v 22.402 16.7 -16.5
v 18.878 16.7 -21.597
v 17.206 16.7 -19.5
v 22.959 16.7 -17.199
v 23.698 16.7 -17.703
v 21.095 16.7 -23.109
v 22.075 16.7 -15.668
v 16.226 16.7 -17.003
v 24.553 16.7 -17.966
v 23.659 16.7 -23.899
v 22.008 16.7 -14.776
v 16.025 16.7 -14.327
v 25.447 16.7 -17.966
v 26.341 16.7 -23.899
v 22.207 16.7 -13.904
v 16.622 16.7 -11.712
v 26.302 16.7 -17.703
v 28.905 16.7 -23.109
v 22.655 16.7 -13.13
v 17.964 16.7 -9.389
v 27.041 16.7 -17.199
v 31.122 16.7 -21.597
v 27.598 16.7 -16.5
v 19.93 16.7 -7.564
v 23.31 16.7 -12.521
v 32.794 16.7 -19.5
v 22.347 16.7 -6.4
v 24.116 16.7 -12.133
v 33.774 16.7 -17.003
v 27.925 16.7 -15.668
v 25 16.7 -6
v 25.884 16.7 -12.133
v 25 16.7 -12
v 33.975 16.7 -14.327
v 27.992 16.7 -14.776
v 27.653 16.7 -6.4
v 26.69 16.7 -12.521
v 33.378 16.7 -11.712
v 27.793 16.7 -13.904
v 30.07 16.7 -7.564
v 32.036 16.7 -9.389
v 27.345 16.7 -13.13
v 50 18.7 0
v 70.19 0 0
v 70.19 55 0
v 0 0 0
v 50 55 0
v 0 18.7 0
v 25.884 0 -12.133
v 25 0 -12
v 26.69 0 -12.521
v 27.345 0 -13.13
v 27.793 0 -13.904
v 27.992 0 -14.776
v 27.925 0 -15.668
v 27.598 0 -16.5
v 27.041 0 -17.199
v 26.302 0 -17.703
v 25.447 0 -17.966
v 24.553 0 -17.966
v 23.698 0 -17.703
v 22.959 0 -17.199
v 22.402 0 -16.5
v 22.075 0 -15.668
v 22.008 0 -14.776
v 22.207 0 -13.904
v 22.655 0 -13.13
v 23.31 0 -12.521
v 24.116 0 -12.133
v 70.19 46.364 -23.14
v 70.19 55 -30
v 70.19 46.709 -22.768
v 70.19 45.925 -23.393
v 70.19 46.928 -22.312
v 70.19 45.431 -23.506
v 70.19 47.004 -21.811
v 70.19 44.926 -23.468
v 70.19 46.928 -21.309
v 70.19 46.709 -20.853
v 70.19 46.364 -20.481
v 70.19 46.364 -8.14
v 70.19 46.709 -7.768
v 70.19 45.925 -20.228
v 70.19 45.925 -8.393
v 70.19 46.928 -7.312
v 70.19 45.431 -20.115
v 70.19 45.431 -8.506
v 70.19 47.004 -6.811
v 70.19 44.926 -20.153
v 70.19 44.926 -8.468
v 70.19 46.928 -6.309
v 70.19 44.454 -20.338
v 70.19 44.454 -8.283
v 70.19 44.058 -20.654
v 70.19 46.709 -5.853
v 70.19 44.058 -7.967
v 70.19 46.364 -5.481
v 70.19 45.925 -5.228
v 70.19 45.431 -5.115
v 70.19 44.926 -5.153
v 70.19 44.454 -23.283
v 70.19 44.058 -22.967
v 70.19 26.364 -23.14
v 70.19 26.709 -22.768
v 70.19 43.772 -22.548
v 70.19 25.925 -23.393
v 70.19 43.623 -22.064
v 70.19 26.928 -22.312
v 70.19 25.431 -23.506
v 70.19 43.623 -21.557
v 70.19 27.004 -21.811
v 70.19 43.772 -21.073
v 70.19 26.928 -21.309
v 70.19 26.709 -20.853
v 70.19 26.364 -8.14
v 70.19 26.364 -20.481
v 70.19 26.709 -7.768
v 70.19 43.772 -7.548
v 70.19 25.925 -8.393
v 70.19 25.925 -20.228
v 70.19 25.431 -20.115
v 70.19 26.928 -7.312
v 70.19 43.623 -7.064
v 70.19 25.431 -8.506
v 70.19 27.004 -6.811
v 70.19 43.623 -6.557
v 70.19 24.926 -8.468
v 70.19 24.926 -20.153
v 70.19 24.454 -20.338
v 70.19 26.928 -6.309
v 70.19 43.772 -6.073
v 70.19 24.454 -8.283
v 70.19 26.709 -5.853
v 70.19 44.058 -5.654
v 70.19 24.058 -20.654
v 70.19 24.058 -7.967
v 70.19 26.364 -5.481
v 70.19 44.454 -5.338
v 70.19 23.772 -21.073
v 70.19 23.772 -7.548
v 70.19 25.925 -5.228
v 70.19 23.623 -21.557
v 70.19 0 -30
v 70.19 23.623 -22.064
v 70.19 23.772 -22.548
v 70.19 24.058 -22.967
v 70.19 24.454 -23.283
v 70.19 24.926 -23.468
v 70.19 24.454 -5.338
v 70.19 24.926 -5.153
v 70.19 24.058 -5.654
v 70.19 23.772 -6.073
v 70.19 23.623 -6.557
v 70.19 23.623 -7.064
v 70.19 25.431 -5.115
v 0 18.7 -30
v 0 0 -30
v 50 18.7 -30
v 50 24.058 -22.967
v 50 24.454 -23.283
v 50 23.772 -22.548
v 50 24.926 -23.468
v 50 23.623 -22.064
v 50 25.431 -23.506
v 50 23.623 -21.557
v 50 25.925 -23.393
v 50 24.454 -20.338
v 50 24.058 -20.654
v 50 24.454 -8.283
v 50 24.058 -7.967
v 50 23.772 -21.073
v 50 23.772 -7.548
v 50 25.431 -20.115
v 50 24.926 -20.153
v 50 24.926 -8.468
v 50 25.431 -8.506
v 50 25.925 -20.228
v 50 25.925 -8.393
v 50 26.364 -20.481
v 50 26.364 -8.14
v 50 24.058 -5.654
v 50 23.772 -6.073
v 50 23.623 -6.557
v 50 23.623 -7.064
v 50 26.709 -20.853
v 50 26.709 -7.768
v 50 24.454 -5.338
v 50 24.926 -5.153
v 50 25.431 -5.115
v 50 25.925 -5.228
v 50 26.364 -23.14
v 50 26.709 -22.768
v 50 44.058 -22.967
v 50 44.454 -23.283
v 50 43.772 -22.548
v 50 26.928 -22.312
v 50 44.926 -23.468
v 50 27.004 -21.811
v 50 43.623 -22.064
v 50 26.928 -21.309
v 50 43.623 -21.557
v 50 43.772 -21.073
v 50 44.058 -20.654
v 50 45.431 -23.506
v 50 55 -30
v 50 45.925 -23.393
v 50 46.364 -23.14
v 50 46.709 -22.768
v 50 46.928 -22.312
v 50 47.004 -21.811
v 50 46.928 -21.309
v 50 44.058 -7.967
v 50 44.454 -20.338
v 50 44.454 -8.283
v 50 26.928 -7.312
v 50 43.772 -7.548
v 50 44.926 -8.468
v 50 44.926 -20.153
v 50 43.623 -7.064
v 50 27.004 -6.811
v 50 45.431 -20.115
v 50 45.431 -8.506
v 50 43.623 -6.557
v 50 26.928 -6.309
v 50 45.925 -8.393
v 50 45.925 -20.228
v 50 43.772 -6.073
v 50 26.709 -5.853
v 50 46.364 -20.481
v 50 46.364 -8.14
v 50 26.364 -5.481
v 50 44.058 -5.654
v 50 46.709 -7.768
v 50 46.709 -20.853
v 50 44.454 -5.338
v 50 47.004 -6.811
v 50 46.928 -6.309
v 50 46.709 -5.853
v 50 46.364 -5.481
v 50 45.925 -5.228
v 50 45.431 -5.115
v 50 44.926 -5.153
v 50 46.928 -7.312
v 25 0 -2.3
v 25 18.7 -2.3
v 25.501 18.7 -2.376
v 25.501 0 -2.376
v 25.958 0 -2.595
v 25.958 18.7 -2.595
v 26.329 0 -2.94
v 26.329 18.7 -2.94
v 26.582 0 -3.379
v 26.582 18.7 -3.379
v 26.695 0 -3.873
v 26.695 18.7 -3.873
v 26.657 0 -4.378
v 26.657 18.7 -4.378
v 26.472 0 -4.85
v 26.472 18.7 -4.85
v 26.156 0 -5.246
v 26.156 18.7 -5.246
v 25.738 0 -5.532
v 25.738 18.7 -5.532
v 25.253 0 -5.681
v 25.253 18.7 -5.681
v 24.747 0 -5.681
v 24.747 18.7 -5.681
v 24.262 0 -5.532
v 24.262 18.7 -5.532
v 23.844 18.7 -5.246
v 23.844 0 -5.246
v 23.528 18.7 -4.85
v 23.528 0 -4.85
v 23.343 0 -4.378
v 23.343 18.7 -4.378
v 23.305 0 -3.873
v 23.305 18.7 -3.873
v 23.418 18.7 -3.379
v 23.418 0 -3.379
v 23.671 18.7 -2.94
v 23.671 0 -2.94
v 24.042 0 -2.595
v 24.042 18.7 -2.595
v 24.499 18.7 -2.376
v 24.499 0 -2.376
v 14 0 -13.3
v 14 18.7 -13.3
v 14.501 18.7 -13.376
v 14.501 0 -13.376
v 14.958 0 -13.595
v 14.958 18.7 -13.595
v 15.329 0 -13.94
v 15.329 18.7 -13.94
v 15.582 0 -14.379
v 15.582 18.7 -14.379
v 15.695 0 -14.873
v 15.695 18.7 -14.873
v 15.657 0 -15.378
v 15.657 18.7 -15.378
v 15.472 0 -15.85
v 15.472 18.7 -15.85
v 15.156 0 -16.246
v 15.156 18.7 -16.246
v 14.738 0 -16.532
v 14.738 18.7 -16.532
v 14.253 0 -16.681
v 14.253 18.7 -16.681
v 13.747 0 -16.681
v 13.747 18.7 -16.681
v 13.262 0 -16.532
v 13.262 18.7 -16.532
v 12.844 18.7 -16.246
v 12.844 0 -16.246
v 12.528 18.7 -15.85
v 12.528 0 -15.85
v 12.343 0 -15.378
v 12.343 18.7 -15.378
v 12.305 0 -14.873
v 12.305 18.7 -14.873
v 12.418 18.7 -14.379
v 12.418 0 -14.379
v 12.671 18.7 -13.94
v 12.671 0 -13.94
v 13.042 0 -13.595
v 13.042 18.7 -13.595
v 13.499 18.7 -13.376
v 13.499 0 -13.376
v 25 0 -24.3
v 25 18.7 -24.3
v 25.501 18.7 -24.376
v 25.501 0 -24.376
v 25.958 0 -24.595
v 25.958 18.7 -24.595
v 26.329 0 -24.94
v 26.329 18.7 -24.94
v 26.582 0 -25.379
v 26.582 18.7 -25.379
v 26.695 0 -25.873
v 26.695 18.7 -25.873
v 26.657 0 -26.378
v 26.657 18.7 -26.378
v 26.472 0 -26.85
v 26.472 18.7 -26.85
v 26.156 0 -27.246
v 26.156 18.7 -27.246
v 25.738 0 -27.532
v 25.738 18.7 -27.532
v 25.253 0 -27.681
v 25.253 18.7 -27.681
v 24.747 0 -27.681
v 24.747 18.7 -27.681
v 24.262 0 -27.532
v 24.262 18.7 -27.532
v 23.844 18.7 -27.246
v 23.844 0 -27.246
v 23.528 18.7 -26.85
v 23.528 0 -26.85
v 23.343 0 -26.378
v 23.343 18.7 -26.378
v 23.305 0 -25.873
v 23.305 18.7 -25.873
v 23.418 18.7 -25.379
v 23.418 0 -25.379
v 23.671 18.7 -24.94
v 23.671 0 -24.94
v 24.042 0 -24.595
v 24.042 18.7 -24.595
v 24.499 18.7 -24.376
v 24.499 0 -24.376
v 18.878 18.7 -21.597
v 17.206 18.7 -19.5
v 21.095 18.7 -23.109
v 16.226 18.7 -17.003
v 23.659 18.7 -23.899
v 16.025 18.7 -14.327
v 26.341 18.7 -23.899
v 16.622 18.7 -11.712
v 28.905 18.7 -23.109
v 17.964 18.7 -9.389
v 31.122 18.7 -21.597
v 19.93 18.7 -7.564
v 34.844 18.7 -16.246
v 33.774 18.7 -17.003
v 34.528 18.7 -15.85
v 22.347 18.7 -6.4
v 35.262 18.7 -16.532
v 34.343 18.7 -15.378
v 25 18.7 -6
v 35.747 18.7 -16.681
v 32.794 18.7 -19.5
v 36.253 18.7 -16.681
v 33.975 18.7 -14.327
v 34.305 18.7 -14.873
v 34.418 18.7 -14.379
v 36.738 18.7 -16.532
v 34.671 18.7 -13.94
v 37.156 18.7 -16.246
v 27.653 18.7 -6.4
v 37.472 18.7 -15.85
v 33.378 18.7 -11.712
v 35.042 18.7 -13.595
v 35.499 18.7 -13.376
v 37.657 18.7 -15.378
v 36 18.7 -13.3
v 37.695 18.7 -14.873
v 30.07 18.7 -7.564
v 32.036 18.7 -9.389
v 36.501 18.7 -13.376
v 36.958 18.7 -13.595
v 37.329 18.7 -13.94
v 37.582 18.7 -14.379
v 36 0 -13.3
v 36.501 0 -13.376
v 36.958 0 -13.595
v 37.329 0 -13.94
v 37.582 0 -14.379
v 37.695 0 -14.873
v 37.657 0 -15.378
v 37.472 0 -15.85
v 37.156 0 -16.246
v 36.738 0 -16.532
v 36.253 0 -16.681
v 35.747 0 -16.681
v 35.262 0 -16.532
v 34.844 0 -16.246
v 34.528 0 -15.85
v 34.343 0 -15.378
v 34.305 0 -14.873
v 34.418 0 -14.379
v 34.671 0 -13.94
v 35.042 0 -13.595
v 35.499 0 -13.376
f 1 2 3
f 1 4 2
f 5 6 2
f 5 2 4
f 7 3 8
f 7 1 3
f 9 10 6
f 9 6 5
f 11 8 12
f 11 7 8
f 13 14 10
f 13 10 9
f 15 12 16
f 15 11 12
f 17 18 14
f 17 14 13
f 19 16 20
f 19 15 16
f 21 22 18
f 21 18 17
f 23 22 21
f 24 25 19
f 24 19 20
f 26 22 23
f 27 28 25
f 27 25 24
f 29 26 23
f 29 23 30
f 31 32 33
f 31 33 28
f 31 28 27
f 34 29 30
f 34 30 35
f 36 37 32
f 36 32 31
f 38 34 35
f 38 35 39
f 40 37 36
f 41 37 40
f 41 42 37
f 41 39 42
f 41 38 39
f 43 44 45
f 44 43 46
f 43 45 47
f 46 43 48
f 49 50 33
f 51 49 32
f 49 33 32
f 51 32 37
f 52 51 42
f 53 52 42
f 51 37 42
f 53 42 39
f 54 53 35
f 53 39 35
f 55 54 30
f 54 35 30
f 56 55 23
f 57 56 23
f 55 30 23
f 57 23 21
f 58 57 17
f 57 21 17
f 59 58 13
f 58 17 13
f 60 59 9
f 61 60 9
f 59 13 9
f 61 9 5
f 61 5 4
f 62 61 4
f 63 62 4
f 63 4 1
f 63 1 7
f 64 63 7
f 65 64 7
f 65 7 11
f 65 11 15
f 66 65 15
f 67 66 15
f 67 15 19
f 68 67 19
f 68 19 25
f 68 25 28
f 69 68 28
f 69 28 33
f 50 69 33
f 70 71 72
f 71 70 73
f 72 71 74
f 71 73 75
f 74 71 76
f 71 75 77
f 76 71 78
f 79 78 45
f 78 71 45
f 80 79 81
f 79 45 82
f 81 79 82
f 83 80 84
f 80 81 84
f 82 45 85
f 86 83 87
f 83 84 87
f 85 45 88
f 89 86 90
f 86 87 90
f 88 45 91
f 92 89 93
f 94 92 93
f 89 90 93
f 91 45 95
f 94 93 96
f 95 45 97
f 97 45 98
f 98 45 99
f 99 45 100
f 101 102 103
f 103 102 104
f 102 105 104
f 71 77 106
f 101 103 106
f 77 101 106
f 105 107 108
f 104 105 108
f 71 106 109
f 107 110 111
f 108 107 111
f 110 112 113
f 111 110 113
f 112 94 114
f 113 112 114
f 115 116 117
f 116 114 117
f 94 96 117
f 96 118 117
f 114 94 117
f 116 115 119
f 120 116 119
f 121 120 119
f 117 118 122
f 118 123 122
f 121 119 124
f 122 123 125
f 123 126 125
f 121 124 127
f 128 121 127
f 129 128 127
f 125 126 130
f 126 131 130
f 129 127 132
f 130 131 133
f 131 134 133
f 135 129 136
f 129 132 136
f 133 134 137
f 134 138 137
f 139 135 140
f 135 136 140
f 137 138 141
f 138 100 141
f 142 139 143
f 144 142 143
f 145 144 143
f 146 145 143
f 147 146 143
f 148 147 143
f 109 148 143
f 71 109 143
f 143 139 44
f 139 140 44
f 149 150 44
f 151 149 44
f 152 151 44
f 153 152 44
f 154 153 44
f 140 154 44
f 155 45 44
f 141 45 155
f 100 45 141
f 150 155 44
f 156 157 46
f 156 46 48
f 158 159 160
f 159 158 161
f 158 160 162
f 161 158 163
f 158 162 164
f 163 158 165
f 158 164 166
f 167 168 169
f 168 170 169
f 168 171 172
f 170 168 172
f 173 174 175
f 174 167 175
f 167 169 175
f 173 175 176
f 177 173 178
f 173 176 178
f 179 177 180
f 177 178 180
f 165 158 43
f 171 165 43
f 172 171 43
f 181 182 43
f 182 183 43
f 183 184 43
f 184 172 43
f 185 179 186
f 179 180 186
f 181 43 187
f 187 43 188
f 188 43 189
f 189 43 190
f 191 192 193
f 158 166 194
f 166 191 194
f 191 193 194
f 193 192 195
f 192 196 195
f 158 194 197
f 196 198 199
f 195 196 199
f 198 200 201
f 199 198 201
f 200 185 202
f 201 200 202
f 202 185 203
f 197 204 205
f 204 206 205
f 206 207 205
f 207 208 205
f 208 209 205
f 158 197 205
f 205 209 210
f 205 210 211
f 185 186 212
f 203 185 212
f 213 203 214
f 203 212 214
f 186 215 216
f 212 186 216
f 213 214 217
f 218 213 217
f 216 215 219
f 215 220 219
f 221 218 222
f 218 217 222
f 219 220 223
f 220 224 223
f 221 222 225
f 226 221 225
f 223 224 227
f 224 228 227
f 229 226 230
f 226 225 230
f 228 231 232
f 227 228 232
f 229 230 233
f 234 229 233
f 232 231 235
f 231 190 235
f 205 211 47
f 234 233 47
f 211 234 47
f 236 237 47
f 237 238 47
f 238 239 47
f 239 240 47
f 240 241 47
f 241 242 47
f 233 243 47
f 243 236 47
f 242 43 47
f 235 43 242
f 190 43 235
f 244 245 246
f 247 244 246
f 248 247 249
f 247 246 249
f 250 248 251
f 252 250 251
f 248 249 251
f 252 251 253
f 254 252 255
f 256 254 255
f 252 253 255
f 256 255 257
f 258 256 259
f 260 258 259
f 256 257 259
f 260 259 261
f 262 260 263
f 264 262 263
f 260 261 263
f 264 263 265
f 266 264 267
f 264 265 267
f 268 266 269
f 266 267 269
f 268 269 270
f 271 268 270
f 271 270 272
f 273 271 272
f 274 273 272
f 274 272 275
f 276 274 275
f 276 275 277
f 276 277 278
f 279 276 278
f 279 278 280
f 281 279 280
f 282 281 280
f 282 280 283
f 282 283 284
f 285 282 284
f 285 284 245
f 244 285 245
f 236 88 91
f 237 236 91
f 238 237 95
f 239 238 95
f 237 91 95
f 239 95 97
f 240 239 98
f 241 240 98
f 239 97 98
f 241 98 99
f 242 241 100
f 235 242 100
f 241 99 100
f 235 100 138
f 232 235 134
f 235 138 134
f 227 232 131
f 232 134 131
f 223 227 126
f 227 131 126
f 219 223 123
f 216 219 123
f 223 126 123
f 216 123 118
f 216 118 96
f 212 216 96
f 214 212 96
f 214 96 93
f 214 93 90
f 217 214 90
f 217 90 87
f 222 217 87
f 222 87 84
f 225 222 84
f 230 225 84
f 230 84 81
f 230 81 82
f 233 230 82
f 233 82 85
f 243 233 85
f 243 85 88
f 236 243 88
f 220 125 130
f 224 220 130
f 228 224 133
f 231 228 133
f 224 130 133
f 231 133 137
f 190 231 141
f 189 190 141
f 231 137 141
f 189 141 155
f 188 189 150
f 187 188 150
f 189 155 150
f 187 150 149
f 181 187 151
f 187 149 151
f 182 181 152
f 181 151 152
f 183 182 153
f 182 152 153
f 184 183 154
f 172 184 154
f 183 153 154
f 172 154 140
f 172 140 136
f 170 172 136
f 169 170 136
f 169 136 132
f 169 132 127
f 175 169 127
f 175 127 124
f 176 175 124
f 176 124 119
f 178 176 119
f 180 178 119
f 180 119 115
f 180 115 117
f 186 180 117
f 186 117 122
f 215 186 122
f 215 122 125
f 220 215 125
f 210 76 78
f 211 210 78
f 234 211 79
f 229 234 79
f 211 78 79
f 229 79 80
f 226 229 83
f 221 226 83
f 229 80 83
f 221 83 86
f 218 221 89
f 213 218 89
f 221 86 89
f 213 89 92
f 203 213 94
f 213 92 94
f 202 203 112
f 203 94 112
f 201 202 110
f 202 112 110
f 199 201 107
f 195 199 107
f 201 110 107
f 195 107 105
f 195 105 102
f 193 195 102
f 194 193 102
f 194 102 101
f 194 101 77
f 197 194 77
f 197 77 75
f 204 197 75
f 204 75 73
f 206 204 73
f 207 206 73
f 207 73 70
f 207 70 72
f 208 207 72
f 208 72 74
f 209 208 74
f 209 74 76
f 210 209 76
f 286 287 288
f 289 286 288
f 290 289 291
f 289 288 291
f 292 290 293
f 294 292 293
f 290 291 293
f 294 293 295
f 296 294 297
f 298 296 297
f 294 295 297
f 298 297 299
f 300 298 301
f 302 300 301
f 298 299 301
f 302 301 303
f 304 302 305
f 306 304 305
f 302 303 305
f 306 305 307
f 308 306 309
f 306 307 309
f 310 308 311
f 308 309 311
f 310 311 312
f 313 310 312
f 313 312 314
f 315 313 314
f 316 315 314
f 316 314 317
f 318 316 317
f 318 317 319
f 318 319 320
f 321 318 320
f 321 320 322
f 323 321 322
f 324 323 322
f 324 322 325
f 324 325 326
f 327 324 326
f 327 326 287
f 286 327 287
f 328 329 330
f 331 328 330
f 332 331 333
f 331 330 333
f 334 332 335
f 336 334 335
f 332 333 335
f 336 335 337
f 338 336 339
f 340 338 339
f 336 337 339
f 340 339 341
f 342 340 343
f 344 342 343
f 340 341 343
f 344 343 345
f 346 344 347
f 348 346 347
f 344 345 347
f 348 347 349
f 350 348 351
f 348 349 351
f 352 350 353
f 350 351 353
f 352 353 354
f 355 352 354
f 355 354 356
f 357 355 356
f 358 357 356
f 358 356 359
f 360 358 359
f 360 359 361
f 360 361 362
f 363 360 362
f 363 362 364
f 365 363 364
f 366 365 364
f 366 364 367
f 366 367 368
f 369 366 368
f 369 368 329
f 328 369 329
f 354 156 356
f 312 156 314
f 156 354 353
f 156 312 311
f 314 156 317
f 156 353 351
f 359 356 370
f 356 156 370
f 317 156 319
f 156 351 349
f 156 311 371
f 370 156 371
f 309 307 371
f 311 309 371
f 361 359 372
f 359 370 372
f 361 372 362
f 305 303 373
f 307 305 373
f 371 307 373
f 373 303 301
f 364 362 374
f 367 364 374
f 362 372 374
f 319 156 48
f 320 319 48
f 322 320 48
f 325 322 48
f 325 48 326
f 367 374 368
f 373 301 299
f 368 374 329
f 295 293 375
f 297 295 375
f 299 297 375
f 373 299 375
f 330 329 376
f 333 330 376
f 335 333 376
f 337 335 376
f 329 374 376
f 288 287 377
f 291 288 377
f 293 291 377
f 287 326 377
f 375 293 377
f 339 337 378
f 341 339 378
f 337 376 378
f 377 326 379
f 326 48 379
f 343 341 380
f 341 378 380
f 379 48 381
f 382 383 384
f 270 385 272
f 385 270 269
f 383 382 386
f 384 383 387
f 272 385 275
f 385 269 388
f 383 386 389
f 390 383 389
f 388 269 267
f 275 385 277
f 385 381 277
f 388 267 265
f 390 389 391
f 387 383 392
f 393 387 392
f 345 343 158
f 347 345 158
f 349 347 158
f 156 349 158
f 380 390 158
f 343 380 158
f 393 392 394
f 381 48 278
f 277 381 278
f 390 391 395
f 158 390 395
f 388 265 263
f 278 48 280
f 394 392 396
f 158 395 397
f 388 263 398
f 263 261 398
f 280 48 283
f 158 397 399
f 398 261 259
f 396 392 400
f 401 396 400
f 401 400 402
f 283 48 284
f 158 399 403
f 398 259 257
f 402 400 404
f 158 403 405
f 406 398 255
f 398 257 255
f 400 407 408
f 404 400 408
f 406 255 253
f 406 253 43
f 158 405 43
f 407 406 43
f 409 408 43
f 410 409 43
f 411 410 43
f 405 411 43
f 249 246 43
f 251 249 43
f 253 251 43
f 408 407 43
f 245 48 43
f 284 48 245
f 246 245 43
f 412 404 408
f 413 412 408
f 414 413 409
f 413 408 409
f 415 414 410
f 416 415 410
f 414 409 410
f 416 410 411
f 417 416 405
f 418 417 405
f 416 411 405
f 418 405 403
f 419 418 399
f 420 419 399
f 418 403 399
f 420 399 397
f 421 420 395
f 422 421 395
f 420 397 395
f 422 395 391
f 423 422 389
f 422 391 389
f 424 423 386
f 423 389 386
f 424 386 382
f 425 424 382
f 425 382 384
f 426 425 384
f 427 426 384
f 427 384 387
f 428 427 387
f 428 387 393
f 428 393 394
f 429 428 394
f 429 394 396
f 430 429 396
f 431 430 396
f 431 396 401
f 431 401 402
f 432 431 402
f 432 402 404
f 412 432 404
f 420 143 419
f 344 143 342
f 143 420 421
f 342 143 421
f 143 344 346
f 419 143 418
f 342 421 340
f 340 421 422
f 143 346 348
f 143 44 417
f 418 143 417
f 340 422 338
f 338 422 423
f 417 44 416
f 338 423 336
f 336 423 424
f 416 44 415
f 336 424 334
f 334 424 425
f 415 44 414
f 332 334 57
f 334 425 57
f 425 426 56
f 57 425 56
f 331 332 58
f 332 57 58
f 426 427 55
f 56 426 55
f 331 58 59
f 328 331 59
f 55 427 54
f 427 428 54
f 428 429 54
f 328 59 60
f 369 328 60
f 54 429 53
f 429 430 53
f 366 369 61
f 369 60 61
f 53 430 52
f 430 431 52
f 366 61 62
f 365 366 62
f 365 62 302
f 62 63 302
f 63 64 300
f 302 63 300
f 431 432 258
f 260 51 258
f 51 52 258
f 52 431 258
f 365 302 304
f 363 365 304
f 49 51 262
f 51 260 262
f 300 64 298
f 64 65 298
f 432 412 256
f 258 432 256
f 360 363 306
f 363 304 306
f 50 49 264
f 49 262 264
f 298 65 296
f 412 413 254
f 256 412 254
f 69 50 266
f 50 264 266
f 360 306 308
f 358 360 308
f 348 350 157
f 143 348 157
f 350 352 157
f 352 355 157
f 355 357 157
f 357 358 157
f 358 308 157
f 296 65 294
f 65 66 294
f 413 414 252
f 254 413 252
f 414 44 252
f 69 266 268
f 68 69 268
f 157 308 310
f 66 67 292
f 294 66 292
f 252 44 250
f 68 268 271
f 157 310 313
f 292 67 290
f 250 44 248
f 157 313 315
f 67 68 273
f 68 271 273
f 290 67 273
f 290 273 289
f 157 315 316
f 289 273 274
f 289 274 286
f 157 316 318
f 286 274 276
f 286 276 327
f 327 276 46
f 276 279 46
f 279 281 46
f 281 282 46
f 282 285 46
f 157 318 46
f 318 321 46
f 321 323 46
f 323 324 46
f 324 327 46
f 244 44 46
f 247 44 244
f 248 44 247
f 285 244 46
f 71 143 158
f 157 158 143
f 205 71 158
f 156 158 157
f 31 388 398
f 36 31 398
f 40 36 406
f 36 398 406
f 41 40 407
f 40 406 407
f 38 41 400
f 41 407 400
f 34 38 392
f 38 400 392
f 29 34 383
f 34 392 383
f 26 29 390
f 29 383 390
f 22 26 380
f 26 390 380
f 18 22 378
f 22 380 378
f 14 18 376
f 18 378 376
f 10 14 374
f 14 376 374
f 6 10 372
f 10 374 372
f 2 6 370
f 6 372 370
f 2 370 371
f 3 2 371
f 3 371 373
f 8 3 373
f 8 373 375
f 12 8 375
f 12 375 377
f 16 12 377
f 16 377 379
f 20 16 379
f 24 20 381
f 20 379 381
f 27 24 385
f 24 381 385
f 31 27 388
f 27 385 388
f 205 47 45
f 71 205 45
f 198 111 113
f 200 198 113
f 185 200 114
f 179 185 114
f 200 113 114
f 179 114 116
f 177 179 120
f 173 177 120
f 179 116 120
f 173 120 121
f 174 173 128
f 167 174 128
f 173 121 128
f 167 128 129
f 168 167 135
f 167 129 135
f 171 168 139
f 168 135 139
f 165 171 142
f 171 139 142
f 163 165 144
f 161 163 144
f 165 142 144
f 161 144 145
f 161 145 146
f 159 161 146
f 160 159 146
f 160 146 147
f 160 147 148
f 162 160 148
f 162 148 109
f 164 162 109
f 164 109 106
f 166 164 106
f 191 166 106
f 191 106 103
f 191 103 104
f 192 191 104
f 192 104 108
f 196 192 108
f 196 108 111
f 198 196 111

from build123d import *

# Parameters (mm, degrees)
BOSS_EXTRUDE1_DEPTH = 30
SKETCH2_R           = 9
CUT_EXTRUDE1_DEPTH  = 2
SKETCH4_R           = 1.7
SKETCH4_R_2         = 3
CUT_EXTRUDE2_DEPTH  = 85.524115494
SKETCH5_R           = 1.7
CUT_EXTRUDE3_DEPTH  = 95.083133983


with BuildPart() as part:
    # Sketch1 → Boss-Extrude1 (new body)
    with BuildSketch(Plane.XY):
        Polygon((0, 0), (0, 18.7), (50, 18.7), (50, 55), (70.19, 55), (70.19, 0), align=None)
    extrude(amount=-BOSS_EXTRUDE1_DEPTH)

    # Sketch2 → Cut-Extrude1 (cut)
    with BuildSketch(Plane(origin=(0, 18.7, 0), x_dir=(1, 0, 0), z_dir=(0, 1, 0))):
        with Locations(Location((25, 15, 0), (0, 0, 270))):
            Circle(SKETCH2_R)
    extrude(amount=-CUT_EXTRUDE1_DEPTH, mode=Mode.SUBTRACT)

    # Sketch4 → Cut-Extrude2 (cut, through all)
    with BuildSketch(Plane(origin=(0, 18.7, 0), x_dir=(1, 0, 0), z_dir=(0, 1, 0))):
        with Locations(Location((25, 26, 0), (0, 0, 270))):
            Circle(SKETCH4_R)
        with Locations(Location((36, 15, 0), (0, 0, 270))):
            Circle(SKETCH4_R)
        with Locations(Location((25, 4, 0), (0, 0, 270))):
            Circle(SKETCH4_R)
        with Locations(Location((14, 15, 0), (0, 0, 270))):
            Circle(SKETCH4_R)
        with Locations(Location((25, 15, 0), (0, 0, 270))):
            Circle(SKETCH4_R_2)
    extrude(amount=-CUT_EXTRUDE2_DEPTH, mode=Mode.SUBTRACT)

    # Sketch5 → Cut-Extrude3 (cut, through all)
    with BuildSketch(Plane(origin=(70.19, 0, 0), x_dir=(0, 0, -1), z_dir=(1, 0, 0))):
        with Locations(Location((6.810503995, 45.303971798, 0), (0, 0, 90))):
            Circle(SKETCH5_R)
        with Locations(Location((6.810503995, 25.303971798, 0), (0, 0, 90))):
            Circle(SKETCH5_R)
        with Locations(Location((21.810503995, 45.303971798, 0), (0, 0, 90))):
            Circle(SKETCH5_R)
        with Locations(Location((21.810503995, 25.303971798, 0), (0, 0, 90))):
            Circle(SKETCH5_R)
    extrude(amount=-CUT_EXTRUDE3_DEPTH, mode=Mode.SUBTRACT)


solid = part.part
